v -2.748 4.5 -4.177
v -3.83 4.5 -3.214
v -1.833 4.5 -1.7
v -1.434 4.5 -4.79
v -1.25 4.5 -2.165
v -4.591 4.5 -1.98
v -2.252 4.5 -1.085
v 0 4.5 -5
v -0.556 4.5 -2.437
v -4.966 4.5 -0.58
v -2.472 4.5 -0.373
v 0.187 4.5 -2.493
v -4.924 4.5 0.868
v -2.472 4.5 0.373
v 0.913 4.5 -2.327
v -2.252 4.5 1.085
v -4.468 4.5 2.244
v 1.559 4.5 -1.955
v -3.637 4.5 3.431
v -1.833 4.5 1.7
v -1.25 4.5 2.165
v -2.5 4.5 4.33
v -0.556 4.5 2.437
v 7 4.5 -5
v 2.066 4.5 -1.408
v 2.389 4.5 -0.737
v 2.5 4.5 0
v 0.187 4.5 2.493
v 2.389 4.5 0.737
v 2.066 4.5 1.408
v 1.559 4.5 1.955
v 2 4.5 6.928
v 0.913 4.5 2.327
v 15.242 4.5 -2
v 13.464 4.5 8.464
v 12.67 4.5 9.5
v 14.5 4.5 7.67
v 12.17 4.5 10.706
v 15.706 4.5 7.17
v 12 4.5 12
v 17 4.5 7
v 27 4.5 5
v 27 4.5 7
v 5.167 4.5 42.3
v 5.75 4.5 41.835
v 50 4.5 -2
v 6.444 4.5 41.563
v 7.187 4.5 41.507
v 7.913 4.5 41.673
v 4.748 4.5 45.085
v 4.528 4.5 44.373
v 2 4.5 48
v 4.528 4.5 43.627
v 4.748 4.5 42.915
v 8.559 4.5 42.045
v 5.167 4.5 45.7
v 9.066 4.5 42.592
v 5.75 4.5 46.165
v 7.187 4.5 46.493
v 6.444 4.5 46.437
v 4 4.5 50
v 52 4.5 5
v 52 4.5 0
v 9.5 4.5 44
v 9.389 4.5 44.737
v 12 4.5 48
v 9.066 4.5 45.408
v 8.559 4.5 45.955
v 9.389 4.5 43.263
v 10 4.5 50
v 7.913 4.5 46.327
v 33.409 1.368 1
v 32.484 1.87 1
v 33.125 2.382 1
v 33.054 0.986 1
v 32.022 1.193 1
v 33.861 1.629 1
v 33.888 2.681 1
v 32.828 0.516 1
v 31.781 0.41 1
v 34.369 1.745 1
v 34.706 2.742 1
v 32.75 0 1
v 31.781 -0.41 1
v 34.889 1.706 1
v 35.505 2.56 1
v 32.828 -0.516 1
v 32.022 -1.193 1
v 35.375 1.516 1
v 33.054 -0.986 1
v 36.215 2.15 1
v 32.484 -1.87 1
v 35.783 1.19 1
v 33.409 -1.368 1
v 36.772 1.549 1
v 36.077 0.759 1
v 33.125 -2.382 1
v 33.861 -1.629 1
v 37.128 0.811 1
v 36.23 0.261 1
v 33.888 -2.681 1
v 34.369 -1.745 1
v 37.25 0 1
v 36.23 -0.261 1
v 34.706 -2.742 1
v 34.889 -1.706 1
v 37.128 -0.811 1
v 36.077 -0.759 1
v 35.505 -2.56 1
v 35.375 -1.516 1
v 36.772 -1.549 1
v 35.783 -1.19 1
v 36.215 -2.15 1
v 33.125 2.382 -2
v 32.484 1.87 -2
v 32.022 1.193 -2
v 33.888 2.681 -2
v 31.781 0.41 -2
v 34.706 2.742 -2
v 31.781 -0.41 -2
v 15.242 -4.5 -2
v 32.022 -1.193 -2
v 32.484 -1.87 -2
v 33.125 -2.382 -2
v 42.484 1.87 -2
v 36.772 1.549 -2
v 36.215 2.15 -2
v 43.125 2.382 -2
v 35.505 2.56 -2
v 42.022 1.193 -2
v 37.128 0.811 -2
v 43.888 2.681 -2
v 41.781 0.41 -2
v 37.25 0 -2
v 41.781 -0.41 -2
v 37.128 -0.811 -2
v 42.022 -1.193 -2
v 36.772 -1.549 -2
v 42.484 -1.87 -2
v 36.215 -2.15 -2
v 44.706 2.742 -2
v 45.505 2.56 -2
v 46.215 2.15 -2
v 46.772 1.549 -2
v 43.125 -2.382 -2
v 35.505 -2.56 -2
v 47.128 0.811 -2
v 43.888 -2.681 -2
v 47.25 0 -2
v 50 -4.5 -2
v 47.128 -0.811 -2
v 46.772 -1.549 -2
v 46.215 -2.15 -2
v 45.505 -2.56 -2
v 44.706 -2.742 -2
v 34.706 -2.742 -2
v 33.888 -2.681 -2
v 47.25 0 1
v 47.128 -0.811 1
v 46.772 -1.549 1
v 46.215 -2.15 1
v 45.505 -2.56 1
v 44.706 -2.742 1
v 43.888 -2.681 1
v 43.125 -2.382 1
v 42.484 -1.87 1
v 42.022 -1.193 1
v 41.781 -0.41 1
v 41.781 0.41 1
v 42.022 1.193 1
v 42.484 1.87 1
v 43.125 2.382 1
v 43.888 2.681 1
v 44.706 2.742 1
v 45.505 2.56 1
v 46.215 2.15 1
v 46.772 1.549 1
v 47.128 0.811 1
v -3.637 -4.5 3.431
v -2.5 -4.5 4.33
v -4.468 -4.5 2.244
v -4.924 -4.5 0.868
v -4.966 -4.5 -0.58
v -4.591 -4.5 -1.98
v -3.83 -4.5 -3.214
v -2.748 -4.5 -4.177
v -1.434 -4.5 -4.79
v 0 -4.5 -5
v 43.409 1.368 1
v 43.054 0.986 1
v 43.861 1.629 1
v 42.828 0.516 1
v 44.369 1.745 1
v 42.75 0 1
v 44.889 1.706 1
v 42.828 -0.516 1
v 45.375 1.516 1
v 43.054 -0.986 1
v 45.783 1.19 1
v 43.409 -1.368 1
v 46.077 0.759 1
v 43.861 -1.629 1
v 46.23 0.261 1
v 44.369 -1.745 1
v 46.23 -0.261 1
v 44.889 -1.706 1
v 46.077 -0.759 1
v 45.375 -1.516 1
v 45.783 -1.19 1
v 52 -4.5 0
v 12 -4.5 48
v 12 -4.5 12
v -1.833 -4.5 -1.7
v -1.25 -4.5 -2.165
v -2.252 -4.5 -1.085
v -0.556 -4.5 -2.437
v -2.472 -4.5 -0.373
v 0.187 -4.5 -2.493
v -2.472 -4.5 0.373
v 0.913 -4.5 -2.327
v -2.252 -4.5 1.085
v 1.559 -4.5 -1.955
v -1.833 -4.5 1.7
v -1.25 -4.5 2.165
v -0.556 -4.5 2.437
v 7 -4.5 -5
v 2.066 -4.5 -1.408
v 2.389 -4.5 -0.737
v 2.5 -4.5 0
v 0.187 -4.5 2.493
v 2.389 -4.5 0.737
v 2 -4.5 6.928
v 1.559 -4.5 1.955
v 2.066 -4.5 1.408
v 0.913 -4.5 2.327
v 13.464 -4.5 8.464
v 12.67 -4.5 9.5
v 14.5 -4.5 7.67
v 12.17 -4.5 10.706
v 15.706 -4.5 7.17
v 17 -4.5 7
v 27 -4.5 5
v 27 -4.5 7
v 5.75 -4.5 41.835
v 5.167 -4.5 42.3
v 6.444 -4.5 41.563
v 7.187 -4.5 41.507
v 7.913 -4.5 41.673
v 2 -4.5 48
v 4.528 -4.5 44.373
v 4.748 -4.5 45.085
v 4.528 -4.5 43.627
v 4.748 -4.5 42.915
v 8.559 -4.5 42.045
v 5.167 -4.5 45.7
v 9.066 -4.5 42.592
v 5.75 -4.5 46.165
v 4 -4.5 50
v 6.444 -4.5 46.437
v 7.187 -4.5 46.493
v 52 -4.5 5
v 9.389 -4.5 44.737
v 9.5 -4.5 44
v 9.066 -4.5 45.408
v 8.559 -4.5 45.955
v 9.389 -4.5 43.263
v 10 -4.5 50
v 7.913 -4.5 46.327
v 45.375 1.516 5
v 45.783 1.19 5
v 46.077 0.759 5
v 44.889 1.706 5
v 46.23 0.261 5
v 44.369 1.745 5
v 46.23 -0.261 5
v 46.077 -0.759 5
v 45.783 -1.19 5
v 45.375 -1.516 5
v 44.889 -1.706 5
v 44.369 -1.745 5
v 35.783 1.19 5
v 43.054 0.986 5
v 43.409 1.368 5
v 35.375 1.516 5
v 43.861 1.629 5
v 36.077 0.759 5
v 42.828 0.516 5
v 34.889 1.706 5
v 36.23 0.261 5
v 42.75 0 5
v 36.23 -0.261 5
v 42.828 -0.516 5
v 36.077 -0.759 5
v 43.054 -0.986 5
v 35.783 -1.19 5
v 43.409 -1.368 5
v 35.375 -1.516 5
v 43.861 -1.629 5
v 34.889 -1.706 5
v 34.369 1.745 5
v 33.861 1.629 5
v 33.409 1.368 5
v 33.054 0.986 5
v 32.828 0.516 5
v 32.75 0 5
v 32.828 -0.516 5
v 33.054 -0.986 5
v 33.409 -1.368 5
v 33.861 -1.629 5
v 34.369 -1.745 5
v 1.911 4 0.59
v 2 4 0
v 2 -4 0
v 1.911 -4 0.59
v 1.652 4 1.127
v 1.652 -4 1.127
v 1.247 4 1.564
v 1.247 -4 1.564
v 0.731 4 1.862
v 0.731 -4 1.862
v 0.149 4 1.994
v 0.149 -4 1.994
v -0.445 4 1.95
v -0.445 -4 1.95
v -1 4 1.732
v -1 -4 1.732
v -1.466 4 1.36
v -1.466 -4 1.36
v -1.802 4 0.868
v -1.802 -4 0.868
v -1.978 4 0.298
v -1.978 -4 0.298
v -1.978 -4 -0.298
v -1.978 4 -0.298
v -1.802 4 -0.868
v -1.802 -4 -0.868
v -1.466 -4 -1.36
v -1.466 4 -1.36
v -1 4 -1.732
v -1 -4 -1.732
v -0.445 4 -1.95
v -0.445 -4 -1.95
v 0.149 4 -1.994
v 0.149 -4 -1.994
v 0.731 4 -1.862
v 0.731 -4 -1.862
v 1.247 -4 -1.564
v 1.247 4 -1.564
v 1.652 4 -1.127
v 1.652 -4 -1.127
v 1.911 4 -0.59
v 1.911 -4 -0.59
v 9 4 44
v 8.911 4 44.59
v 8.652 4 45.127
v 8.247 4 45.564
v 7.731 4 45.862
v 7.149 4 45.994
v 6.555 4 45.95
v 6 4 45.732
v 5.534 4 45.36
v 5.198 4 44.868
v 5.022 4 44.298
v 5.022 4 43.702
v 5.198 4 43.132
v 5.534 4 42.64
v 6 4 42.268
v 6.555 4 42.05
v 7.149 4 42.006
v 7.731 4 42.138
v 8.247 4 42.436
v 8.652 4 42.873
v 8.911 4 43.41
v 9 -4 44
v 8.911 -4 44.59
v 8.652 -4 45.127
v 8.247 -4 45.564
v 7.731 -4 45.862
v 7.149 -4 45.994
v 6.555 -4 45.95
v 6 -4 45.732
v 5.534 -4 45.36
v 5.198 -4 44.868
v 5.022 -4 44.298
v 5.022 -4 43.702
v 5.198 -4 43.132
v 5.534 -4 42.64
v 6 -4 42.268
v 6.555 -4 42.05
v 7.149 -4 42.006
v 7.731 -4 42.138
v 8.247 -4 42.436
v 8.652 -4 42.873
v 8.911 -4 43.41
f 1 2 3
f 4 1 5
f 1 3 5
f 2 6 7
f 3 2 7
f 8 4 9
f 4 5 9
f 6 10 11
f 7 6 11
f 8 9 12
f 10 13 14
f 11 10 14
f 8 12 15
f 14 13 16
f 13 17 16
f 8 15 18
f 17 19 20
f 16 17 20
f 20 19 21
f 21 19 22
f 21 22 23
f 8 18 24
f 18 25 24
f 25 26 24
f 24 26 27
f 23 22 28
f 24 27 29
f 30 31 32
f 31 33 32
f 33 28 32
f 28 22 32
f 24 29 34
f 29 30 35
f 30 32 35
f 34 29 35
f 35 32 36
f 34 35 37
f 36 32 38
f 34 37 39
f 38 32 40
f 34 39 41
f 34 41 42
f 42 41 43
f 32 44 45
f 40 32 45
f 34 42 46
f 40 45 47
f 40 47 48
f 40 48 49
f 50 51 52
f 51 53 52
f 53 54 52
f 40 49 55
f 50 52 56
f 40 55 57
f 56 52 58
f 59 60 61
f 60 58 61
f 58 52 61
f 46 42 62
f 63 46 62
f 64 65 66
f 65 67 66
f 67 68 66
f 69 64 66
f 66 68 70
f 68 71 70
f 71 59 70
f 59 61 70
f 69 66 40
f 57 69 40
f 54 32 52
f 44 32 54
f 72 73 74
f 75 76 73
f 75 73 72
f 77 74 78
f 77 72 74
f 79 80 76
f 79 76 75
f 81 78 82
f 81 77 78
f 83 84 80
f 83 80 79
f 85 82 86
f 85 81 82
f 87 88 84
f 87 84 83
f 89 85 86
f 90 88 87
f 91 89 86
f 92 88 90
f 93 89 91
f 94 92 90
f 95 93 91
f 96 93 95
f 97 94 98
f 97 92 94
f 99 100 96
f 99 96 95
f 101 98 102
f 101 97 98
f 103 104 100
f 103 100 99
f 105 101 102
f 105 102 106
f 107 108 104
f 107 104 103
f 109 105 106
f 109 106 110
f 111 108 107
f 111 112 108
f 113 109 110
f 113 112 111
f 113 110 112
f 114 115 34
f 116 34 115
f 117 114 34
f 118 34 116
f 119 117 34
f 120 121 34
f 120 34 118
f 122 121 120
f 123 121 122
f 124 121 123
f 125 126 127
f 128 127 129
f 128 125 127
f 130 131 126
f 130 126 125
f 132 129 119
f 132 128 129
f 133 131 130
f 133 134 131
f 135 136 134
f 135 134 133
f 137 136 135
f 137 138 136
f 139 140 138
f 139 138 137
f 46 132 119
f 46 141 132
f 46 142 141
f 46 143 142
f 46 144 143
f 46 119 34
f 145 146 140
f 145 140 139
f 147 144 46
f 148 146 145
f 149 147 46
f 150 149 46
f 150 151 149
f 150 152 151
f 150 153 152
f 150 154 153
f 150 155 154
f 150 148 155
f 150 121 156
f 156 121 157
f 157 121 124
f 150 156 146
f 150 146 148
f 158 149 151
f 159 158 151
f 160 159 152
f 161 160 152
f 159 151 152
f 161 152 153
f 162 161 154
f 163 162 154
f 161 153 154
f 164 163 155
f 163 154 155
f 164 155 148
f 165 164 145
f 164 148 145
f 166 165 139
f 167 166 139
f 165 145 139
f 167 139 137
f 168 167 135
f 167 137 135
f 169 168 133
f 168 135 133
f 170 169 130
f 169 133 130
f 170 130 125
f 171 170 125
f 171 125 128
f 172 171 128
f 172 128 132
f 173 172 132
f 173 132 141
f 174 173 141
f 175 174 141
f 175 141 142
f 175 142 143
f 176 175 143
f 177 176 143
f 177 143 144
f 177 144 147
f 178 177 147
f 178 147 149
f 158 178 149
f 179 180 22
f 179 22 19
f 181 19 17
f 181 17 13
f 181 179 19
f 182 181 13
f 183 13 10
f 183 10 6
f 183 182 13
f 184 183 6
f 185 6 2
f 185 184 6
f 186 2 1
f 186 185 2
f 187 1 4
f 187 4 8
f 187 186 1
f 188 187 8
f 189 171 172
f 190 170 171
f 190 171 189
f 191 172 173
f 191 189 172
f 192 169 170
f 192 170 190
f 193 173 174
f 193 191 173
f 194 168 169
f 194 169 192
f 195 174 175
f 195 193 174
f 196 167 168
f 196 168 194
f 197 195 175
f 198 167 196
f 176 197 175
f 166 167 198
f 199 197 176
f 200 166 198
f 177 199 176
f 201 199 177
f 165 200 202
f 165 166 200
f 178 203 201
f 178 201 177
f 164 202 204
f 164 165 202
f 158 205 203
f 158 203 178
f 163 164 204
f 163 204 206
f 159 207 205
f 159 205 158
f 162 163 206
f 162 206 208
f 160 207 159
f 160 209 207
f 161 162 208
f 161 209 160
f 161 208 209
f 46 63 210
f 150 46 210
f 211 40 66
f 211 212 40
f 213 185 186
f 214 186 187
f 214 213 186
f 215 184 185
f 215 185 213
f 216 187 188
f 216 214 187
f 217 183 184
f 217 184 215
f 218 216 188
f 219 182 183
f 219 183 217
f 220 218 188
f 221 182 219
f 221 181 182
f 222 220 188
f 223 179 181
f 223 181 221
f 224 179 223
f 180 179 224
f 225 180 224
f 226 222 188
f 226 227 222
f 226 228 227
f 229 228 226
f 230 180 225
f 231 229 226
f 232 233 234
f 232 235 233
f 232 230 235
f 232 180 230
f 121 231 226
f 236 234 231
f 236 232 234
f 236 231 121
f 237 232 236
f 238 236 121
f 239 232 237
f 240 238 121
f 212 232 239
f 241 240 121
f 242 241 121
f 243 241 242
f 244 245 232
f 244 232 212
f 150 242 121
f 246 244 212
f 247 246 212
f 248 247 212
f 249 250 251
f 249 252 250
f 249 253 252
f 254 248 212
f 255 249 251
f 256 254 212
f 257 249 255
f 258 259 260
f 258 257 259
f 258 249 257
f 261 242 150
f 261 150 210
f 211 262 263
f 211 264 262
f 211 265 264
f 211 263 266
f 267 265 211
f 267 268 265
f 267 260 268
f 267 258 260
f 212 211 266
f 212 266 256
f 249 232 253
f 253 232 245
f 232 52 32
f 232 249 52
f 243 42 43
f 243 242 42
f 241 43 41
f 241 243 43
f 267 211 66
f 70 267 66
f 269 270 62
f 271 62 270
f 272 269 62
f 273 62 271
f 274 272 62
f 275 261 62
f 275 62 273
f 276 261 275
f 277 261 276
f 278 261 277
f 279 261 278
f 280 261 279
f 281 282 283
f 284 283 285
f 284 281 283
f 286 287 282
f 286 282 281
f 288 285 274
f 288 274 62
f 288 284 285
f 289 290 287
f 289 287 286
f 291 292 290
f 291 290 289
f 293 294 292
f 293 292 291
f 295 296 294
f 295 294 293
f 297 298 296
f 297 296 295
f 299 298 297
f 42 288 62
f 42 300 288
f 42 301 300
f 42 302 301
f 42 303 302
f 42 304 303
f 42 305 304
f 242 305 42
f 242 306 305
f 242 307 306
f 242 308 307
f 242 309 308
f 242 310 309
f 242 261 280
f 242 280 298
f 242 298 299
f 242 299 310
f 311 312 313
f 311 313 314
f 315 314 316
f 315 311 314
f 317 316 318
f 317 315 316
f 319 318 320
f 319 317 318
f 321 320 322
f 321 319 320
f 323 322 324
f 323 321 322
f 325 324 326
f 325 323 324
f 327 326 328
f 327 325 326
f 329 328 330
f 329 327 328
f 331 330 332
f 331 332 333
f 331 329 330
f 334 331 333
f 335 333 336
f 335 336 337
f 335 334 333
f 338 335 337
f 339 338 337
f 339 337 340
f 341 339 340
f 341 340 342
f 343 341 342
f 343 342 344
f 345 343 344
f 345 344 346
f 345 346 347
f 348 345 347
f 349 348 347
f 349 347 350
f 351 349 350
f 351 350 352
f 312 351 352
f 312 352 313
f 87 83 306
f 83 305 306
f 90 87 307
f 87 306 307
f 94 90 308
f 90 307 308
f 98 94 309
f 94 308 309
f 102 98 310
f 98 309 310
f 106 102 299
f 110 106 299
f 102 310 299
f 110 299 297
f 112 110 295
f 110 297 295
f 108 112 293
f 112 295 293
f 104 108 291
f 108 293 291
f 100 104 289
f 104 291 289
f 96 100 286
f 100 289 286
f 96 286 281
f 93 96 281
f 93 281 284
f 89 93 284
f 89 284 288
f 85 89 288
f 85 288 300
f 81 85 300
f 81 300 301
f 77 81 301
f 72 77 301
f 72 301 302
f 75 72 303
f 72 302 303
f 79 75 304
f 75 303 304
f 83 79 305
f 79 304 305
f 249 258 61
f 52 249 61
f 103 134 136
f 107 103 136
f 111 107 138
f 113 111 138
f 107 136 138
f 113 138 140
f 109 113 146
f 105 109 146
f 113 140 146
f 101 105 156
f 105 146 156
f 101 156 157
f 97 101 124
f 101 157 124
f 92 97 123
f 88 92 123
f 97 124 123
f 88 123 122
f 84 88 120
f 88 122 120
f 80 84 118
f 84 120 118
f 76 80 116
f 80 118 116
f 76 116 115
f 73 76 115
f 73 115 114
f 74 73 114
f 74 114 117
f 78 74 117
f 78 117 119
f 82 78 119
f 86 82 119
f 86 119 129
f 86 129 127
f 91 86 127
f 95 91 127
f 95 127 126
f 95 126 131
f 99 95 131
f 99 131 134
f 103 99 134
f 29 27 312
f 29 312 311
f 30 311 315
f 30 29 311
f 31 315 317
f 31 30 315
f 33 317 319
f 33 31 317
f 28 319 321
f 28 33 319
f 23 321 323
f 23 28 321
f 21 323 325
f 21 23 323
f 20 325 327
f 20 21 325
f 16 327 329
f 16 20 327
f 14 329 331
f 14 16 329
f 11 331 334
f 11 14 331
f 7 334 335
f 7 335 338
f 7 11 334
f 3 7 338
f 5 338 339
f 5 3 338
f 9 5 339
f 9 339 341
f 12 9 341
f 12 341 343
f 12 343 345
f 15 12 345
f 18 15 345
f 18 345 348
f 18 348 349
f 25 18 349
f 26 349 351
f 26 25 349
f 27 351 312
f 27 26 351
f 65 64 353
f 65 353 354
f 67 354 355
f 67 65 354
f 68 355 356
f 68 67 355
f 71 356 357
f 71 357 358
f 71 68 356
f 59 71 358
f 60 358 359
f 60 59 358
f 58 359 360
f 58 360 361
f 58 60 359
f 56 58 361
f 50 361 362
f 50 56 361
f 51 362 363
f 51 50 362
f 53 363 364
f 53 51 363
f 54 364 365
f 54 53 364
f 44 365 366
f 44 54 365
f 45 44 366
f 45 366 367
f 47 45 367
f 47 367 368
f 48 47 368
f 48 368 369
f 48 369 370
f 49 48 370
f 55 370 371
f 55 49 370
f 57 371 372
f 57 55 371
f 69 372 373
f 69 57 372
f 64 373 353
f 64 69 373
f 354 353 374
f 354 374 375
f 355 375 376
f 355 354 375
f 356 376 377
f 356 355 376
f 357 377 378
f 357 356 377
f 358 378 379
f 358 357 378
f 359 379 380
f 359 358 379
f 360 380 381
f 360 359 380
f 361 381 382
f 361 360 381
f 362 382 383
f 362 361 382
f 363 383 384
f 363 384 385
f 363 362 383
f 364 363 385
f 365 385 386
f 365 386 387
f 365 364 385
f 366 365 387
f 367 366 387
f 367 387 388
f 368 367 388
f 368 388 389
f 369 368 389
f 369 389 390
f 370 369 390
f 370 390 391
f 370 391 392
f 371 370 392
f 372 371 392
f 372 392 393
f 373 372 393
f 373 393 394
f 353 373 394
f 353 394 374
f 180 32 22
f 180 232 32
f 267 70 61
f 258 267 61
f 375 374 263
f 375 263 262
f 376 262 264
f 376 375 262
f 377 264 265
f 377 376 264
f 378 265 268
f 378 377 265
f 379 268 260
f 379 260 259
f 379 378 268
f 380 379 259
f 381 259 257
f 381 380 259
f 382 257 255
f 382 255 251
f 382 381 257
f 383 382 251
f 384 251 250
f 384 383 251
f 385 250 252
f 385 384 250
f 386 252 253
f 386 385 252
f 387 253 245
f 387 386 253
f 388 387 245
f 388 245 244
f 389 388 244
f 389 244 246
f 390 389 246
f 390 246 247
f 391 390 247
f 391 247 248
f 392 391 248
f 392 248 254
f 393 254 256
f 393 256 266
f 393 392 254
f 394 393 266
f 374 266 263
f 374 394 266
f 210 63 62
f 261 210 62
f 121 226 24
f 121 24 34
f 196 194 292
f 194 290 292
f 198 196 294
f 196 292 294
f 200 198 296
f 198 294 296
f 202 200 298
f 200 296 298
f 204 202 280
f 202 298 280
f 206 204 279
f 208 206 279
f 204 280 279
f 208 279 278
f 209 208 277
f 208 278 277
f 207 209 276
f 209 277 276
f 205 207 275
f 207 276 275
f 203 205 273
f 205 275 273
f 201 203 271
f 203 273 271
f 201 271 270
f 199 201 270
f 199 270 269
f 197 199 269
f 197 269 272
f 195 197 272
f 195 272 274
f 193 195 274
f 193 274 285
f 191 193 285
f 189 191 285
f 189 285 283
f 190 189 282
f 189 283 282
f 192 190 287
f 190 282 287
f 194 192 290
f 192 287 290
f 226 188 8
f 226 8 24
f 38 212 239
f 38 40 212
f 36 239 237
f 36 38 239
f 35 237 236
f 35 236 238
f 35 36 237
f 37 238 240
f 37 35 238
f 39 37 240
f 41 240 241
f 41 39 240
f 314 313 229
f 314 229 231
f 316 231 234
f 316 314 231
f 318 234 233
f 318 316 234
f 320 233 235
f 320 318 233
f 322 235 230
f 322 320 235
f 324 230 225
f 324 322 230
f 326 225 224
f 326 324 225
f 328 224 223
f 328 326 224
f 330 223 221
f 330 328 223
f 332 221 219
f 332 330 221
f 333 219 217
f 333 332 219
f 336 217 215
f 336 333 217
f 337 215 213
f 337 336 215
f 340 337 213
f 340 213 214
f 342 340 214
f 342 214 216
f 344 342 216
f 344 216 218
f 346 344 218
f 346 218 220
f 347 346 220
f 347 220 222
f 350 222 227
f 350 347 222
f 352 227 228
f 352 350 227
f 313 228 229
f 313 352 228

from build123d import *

# Parameters (mm, degrees)
F0_R           = 2
F1_DEPTH       = 4.5
F2_SIZE        = 0.5
F3_SIZE        = 2
F4_R           = 5
F6_D           = 3.5
F6_CBORE_D     = 5.5
F6_CBORE_DEPTH = 3


with BuildPart() as f1:
    # F0 (on Front) → F1 (new body, symmetric)
    with BuildSketch(Plane.XZ):
        with BuildLine():
            Line((2, 6.928203), (-2.5, 4.330127))
            ThreePointArc((-2.5, 4.330127), (-4.829629, -1.294095), (0, -5))
            Line((0, -5), (7, -5))
            Line((7, -5), (15.242432, -2))
            Line((15.242432, -2), (52, -2))
            Line((52, -2), (52, 5))
            Line((52, 5), (27, 5))
            Line((27, 5), (27, 7))
            Line((27, 7), (12, 7))
            Line((12, 7), (12, 50))
            Line((12, 50), (2, 50))
            Line((2, 50), (2, 6.928203))
        make_face()
        Circle(F0_R, mode=Mode.SUBTRACT)
        with Locations((7, 44)):
            Circle(F0_R, mode=Mode.SUBTRACT)
    extrude(amount=F1_DEPTH, both=True)

    # F2
    f2_edges = [f1.edges().sort_by_distance(p)[0] for p in [
        (5, -4.5, 44),
        (-2, -4.5, 0),
        (5, 4.5, 44),
        (-2, 4.5, 0),
    ]]
    chamfer(f2_edges, length=F2_SIZE)

    # F3
    f3_edges = [f1.edges().sort_by_distance(p)[0] for p in [
        (12, 0, 50),
        (2, 0, 50),
        (52, 0, -2),
    ]]
    chamfer(f3_edges, length=F3_SIZE)

    # F4
    f4_edges = [f1.edges().sort_by_distance(p)[0] for p in [
        (12, 0, 7),
    ]]
    fillet(f4_edges, radius=F4_R)

    # F6 (through all)
    with Locations(Plane(origin=(0, 0, -2), x_dir=(1, 0, 0), z_dir=(0, 0, -1))):
        with Locations((44.5, 0), (34.5, 0)):
            CounterBoreHole(F6_D / 2, F6_CBORE_D / 2, F6_CBORE_DEPTH)


solid = f1.part
